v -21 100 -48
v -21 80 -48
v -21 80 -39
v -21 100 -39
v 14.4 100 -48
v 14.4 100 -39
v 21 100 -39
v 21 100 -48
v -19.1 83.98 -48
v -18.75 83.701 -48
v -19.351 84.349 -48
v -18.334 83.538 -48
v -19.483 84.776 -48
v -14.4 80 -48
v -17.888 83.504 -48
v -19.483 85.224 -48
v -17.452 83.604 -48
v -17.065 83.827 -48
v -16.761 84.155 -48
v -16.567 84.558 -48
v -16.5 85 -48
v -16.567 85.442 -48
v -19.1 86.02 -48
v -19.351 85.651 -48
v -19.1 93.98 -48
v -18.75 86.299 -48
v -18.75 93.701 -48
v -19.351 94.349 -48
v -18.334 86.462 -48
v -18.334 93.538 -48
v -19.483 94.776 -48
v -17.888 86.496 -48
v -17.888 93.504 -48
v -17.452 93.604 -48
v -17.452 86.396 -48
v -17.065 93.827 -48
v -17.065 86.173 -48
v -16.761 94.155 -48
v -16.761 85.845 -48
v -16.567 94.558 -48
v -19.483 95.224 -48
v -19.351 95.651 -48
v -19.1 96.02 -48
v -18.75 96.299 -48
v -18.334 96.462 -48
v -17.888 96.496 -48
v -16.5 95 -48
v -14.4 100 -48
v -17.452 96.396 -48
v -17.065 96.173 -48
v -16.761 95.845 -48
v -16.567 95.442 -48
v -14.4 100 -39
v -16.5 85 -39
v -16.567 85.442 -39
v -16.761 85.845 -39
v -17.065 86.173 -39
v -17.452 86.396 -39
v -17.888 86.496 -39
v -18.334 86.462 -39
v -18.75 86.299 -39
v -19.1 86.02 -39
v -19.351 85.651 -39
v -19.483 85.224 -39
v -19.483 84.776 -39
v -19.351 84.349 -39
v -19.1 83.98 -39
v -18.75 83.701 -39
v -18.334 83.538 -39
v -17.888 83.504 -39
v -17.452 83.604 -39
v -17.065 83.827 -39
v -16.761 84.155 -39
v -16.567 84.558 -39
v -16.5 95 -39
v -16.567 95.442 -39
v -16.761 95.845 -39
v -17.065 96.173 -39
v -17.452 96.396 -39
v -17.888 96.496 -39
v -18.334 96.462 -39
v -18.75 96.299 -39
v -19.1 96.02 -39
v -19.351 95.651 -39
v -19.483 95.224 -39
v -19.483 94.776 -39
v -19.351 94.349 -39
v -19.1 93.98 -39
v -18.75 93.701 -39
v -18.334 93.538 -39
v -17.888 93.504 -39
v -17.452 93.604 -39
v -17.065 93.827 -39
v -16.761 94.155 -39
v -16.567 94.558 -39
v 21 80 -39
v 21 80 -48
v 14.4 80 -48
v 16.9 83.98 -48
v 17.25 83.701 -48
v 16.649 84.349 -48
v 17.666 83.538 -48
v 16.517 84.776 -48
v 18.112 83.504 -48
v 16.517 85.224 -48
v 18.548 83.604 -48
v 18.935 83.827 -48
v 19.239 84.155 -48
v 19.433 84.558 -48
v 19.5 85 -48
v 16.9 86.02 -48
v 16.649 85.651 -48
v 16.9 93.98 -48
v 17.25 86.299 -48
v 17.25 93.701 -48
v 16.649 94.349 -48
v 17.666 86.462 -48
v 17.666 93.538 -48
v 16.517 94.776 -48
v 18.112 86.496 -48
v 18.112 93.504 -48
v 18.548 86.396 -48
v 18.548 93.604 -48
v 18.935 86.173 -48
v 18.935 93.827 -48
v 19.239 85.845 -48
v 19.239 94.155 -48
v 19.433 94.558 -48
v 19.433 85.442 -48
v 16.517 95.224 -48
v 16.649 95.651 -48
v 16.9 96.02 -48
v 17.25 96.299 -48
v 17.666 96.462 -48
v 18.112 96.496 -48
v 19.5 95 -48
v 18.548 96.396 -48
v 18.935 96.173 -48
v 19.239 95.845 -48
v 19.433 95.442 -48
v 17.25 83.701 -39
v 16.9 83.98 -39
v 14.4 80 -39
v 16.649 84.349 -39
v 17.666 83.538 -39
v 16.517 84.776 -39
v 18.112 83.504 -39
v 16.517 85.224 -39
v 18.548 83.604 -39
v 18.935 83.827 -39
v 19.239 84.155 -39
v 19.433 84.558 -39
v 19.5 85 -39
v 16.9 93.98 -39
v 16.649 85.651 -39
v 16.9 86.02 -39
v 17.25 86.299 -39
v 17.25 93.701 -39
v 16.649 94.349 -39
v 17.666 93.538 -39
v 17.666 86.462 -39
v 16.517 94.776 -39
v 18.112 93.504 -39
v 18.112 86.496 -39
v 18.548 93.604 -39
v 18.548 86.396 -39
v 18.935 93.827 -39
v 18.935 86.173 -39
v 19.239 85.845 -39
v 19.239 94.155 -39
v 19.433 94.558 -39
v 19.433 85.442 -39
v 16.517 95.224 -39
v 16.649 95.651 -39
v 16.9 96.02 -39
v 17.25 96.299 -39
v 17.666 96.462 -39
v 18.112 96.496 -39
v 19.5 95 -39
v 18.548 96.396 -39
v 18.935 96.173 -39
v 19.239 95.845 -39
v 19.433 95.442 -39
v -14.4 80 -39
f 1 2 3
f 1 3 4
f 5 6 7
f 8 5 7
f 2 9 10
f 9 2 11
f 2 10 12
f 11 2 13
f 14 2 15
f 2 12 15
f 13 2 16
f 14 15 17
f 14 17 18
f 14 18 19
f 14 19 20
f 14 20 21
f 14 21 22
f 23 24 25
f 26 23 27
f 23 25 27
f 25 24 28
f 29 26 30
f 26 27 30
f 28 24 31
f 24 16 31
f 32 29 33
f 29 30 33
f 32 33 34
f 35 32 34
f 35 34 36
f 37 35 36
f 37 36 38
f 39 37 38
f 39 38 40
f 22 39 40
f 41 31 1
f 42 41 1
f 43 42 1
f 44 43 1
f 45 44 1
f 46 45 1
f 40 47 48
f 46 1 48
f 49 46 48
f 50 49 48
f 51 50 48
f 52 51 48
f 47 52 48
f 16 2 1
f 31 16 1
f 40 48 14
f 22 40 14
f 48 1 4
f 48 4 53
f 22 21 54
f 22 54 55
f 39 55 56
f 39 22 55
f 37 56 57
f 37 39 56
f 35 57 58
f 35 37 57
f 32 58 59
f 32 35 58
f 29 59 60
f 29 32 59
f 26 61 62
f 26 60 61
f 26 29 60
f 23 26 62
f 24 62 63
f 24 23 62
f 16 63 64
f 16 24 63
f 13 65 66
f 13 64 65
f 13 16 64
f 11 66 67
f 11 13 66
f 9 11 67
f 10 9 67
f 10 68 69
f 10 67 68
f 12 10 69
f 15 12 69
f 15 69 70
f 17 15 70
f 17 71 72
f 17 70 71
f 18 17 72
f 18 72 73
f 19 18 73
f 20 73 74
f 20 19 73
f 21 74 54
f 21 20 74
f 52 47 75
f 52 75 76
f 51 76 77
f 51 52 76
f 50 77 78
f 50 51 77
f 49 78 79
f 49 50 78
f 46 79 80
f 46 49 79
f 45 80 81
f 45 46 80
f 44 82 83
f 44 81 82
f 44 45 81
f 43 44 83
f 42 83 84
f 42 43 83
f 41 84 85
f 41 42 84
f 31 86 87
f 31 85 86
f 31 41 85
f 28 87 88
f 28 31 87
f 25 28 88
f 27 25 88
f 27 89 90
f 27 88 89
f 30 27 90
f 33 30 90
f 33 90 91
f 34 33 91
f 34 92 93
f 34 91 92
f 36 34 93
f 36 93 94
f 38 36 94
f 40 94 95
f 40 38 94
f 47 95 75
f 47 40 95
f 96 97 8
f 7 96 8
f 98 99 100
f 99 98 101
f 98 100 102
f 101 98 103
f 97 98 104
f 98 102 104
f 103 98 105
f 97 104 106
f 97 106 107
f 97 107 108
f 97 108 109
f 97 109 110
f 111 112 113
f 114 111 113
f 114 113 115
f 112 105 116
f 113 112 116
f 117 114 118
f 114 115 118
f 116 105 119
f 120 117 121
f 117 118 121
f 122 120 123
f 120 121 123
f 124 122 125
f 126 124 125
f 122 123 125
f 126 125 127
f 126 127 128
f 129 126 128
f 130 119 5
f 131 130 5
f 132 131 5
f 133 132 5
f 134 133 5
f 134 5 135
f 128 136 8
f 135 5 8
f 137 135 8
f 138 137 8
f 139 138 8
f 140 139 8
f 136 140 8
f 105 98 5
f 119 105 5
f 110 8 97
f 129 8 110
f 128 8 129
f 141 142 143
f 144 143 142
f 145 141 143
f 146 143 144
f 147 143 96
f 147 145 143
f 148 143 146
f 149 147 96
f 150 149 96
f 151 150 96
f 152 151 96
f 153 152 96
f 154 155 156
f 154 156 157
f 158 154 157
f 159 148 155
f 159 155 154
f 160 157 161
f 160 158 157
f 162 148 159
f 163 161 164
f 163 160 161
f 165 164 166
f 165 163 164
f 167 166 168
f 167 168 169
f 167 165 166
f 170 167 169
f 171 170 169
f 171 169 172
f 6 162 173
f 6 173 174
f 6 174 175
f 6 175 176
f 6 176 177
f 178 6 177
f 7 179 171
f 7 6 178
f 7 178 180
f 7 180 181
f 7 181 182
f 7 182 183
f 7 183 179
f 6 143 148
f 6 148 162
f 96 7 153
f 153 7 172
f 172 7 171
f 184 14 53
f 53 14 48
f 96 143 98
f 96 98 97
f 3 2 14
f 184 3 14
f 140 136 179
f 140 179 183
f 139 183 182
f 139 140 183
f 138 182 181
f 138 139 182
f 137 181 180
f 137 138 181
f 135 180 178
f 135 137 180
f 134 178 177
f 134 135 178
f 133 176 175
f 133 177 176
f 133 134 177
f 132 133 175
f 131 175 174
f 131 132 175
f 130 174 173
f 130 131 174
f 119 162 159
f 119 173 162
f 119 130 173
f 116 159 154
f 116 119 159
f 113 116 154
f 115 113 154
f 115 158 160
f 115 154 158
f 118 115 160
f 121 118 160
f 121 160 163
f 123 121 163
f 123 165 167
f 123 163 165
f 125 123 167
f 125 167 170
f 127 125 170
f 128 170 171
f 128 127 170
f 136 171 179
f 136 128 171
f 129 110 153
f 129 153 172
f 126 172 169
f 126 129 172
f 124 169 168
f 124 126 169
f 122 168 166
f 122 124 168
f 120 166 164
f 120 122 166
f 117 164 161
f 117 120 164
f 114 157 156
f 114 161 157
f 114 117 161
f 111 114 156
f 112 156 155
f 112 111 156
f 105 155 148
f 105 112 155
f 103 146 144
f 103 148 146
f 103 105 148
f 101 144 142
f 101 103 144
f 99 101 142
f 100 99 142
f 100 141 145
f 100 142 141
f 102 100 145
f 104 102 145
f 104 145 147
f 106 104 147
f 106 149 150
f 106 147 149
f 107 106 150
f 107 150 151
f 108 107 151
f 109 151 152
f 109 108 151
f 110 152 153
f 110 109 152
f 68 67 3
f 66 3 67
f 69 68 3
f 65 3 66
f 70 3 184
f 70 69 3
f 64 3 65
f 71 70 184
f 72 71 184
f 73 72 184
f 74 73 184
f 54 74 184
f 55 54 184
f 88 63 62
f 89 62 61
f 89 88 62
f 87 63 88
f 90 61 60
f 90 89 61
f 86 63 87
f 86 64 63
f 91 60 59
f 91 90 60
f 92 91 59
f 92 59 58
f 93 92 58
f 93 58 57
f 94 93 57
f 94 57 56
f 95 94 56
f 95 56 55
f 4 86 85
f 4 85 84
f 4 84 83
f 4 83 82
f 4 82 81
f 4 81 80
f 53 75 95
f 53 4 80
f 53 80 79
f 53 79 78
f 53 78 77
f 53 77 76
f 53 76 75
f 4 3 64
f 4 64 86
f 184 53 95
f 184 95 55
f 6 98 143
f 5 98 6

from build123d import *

# Parameters (mm, degrees)
CYLINDER1730_R     = 1.5
CYLINDER1730_DEPTH = 60
CYLINDER1732_R     = 1.5
CYLINDER1732_DEPTH = 60
CYLINDER1729_R     = 1.5
CYLINDER1729_DEPTH = 60
CYLINDER1731_R     = 1.5
CYLINDER1731_DEPTH = 60
BOX668_W           = 28.8
BOX668_H           = 34.21
BOX668_DEPTH       = 9
BOX669_W           = 42
BOX669_H           = 20
BOX669_DEPTH       = 9


with BuildPart() as v_lec1730:
    # Cylinder1730 → Cylinder1730 (new body)
    with BuildSketch(Plane(origin=(18, 85, -57), x_dir=(1, 0, 0), z_dir=(0, 0, 1))):
        Circle(CYLINDER1730_R)
    extrude(amount=CYLINDER1730_DEPTH)


with BuildPart() as v_lec1732:
    # Cylinder1732 → Cylinder1732 (new body)
    with BuildSketch(Plane(origin=(-18, 85, -57), x_dir=(1, 0, 0), z_dir=(0, 0, 1))):
        Circle(CYLINDER1732_R)
    extrude(amount=CYLINDER1732_DEPTH)


with BuildPart() as v_lec1729:
    # Cylinder1729 → Cylinder1729 (new body)
    with BuildSketch(Plane(origin=(-18, 95, -57), x_dir=(1, 0, 0), z_dir=(0, 0, 1))):
        Circle(CYLINDER1729_R)
    extrude(amount=CYLINDER1729_DEPTH)


with BuildPart() as compound855:
    # Cylinder1731 → Cylinder1731 (new body)
    with BuildSketch(Plane(origin=(18, 95, -57), x_dir=(1, 0, 0), z_dir=(0, 0, 1))):
        Circle(CYLINDER1731_R)
    extrude(amount=CYLINDER1731_DEPTH)

    # Compound855: union Válec1730, Válec1732, Válec1729
    add(v_lec1730.part)
    add(v_lec1732.part)
    add(v_lec1729.part)


with BuildPart() as compound853:
    # Box668 → Box668 (new body)
    with BuildSketch(Plane(origin=(-14.4, -15.34, 34), x_dir=(1, 0, 0), z_dir=(0, 0, 1))):
        with Locations((14.4, 17.105)):
            Rectangle(BOX668_W, BOX668_H)
    extrude(amount=BOX668_DEPTH)


with BuildPart() as compound853_1:
    # Compound853 placement: moved
    add(compound853.part.moved(Location((0, 90, -83))))


with BuildPart() as cut362:
    # Box669 → Box669 (new body)
    with BuildSketch(Plane(origin=(-21, 80, -49), x_dir=(1, 0, 0), z_dir=(0, 0, 1))):
        with Locations((21, 10)):
            Rectangle(BOX669_W, BOX669_H)
    extrude(amount=BOX669_DEPTH)

    # Cut358: cut Compound853
    add(compound853_1.part, mode=Mode.SUBTRACT)


with BuildPart() as cut362_1:
    # Cut358 placement: moved
    add(cut362.part.moved(Location((0, 0, 1))))

    # Cut362: cut Compound855
    add(compound855.part, mode=Mode.SUBTRACT)


solid = cut362_1.part
